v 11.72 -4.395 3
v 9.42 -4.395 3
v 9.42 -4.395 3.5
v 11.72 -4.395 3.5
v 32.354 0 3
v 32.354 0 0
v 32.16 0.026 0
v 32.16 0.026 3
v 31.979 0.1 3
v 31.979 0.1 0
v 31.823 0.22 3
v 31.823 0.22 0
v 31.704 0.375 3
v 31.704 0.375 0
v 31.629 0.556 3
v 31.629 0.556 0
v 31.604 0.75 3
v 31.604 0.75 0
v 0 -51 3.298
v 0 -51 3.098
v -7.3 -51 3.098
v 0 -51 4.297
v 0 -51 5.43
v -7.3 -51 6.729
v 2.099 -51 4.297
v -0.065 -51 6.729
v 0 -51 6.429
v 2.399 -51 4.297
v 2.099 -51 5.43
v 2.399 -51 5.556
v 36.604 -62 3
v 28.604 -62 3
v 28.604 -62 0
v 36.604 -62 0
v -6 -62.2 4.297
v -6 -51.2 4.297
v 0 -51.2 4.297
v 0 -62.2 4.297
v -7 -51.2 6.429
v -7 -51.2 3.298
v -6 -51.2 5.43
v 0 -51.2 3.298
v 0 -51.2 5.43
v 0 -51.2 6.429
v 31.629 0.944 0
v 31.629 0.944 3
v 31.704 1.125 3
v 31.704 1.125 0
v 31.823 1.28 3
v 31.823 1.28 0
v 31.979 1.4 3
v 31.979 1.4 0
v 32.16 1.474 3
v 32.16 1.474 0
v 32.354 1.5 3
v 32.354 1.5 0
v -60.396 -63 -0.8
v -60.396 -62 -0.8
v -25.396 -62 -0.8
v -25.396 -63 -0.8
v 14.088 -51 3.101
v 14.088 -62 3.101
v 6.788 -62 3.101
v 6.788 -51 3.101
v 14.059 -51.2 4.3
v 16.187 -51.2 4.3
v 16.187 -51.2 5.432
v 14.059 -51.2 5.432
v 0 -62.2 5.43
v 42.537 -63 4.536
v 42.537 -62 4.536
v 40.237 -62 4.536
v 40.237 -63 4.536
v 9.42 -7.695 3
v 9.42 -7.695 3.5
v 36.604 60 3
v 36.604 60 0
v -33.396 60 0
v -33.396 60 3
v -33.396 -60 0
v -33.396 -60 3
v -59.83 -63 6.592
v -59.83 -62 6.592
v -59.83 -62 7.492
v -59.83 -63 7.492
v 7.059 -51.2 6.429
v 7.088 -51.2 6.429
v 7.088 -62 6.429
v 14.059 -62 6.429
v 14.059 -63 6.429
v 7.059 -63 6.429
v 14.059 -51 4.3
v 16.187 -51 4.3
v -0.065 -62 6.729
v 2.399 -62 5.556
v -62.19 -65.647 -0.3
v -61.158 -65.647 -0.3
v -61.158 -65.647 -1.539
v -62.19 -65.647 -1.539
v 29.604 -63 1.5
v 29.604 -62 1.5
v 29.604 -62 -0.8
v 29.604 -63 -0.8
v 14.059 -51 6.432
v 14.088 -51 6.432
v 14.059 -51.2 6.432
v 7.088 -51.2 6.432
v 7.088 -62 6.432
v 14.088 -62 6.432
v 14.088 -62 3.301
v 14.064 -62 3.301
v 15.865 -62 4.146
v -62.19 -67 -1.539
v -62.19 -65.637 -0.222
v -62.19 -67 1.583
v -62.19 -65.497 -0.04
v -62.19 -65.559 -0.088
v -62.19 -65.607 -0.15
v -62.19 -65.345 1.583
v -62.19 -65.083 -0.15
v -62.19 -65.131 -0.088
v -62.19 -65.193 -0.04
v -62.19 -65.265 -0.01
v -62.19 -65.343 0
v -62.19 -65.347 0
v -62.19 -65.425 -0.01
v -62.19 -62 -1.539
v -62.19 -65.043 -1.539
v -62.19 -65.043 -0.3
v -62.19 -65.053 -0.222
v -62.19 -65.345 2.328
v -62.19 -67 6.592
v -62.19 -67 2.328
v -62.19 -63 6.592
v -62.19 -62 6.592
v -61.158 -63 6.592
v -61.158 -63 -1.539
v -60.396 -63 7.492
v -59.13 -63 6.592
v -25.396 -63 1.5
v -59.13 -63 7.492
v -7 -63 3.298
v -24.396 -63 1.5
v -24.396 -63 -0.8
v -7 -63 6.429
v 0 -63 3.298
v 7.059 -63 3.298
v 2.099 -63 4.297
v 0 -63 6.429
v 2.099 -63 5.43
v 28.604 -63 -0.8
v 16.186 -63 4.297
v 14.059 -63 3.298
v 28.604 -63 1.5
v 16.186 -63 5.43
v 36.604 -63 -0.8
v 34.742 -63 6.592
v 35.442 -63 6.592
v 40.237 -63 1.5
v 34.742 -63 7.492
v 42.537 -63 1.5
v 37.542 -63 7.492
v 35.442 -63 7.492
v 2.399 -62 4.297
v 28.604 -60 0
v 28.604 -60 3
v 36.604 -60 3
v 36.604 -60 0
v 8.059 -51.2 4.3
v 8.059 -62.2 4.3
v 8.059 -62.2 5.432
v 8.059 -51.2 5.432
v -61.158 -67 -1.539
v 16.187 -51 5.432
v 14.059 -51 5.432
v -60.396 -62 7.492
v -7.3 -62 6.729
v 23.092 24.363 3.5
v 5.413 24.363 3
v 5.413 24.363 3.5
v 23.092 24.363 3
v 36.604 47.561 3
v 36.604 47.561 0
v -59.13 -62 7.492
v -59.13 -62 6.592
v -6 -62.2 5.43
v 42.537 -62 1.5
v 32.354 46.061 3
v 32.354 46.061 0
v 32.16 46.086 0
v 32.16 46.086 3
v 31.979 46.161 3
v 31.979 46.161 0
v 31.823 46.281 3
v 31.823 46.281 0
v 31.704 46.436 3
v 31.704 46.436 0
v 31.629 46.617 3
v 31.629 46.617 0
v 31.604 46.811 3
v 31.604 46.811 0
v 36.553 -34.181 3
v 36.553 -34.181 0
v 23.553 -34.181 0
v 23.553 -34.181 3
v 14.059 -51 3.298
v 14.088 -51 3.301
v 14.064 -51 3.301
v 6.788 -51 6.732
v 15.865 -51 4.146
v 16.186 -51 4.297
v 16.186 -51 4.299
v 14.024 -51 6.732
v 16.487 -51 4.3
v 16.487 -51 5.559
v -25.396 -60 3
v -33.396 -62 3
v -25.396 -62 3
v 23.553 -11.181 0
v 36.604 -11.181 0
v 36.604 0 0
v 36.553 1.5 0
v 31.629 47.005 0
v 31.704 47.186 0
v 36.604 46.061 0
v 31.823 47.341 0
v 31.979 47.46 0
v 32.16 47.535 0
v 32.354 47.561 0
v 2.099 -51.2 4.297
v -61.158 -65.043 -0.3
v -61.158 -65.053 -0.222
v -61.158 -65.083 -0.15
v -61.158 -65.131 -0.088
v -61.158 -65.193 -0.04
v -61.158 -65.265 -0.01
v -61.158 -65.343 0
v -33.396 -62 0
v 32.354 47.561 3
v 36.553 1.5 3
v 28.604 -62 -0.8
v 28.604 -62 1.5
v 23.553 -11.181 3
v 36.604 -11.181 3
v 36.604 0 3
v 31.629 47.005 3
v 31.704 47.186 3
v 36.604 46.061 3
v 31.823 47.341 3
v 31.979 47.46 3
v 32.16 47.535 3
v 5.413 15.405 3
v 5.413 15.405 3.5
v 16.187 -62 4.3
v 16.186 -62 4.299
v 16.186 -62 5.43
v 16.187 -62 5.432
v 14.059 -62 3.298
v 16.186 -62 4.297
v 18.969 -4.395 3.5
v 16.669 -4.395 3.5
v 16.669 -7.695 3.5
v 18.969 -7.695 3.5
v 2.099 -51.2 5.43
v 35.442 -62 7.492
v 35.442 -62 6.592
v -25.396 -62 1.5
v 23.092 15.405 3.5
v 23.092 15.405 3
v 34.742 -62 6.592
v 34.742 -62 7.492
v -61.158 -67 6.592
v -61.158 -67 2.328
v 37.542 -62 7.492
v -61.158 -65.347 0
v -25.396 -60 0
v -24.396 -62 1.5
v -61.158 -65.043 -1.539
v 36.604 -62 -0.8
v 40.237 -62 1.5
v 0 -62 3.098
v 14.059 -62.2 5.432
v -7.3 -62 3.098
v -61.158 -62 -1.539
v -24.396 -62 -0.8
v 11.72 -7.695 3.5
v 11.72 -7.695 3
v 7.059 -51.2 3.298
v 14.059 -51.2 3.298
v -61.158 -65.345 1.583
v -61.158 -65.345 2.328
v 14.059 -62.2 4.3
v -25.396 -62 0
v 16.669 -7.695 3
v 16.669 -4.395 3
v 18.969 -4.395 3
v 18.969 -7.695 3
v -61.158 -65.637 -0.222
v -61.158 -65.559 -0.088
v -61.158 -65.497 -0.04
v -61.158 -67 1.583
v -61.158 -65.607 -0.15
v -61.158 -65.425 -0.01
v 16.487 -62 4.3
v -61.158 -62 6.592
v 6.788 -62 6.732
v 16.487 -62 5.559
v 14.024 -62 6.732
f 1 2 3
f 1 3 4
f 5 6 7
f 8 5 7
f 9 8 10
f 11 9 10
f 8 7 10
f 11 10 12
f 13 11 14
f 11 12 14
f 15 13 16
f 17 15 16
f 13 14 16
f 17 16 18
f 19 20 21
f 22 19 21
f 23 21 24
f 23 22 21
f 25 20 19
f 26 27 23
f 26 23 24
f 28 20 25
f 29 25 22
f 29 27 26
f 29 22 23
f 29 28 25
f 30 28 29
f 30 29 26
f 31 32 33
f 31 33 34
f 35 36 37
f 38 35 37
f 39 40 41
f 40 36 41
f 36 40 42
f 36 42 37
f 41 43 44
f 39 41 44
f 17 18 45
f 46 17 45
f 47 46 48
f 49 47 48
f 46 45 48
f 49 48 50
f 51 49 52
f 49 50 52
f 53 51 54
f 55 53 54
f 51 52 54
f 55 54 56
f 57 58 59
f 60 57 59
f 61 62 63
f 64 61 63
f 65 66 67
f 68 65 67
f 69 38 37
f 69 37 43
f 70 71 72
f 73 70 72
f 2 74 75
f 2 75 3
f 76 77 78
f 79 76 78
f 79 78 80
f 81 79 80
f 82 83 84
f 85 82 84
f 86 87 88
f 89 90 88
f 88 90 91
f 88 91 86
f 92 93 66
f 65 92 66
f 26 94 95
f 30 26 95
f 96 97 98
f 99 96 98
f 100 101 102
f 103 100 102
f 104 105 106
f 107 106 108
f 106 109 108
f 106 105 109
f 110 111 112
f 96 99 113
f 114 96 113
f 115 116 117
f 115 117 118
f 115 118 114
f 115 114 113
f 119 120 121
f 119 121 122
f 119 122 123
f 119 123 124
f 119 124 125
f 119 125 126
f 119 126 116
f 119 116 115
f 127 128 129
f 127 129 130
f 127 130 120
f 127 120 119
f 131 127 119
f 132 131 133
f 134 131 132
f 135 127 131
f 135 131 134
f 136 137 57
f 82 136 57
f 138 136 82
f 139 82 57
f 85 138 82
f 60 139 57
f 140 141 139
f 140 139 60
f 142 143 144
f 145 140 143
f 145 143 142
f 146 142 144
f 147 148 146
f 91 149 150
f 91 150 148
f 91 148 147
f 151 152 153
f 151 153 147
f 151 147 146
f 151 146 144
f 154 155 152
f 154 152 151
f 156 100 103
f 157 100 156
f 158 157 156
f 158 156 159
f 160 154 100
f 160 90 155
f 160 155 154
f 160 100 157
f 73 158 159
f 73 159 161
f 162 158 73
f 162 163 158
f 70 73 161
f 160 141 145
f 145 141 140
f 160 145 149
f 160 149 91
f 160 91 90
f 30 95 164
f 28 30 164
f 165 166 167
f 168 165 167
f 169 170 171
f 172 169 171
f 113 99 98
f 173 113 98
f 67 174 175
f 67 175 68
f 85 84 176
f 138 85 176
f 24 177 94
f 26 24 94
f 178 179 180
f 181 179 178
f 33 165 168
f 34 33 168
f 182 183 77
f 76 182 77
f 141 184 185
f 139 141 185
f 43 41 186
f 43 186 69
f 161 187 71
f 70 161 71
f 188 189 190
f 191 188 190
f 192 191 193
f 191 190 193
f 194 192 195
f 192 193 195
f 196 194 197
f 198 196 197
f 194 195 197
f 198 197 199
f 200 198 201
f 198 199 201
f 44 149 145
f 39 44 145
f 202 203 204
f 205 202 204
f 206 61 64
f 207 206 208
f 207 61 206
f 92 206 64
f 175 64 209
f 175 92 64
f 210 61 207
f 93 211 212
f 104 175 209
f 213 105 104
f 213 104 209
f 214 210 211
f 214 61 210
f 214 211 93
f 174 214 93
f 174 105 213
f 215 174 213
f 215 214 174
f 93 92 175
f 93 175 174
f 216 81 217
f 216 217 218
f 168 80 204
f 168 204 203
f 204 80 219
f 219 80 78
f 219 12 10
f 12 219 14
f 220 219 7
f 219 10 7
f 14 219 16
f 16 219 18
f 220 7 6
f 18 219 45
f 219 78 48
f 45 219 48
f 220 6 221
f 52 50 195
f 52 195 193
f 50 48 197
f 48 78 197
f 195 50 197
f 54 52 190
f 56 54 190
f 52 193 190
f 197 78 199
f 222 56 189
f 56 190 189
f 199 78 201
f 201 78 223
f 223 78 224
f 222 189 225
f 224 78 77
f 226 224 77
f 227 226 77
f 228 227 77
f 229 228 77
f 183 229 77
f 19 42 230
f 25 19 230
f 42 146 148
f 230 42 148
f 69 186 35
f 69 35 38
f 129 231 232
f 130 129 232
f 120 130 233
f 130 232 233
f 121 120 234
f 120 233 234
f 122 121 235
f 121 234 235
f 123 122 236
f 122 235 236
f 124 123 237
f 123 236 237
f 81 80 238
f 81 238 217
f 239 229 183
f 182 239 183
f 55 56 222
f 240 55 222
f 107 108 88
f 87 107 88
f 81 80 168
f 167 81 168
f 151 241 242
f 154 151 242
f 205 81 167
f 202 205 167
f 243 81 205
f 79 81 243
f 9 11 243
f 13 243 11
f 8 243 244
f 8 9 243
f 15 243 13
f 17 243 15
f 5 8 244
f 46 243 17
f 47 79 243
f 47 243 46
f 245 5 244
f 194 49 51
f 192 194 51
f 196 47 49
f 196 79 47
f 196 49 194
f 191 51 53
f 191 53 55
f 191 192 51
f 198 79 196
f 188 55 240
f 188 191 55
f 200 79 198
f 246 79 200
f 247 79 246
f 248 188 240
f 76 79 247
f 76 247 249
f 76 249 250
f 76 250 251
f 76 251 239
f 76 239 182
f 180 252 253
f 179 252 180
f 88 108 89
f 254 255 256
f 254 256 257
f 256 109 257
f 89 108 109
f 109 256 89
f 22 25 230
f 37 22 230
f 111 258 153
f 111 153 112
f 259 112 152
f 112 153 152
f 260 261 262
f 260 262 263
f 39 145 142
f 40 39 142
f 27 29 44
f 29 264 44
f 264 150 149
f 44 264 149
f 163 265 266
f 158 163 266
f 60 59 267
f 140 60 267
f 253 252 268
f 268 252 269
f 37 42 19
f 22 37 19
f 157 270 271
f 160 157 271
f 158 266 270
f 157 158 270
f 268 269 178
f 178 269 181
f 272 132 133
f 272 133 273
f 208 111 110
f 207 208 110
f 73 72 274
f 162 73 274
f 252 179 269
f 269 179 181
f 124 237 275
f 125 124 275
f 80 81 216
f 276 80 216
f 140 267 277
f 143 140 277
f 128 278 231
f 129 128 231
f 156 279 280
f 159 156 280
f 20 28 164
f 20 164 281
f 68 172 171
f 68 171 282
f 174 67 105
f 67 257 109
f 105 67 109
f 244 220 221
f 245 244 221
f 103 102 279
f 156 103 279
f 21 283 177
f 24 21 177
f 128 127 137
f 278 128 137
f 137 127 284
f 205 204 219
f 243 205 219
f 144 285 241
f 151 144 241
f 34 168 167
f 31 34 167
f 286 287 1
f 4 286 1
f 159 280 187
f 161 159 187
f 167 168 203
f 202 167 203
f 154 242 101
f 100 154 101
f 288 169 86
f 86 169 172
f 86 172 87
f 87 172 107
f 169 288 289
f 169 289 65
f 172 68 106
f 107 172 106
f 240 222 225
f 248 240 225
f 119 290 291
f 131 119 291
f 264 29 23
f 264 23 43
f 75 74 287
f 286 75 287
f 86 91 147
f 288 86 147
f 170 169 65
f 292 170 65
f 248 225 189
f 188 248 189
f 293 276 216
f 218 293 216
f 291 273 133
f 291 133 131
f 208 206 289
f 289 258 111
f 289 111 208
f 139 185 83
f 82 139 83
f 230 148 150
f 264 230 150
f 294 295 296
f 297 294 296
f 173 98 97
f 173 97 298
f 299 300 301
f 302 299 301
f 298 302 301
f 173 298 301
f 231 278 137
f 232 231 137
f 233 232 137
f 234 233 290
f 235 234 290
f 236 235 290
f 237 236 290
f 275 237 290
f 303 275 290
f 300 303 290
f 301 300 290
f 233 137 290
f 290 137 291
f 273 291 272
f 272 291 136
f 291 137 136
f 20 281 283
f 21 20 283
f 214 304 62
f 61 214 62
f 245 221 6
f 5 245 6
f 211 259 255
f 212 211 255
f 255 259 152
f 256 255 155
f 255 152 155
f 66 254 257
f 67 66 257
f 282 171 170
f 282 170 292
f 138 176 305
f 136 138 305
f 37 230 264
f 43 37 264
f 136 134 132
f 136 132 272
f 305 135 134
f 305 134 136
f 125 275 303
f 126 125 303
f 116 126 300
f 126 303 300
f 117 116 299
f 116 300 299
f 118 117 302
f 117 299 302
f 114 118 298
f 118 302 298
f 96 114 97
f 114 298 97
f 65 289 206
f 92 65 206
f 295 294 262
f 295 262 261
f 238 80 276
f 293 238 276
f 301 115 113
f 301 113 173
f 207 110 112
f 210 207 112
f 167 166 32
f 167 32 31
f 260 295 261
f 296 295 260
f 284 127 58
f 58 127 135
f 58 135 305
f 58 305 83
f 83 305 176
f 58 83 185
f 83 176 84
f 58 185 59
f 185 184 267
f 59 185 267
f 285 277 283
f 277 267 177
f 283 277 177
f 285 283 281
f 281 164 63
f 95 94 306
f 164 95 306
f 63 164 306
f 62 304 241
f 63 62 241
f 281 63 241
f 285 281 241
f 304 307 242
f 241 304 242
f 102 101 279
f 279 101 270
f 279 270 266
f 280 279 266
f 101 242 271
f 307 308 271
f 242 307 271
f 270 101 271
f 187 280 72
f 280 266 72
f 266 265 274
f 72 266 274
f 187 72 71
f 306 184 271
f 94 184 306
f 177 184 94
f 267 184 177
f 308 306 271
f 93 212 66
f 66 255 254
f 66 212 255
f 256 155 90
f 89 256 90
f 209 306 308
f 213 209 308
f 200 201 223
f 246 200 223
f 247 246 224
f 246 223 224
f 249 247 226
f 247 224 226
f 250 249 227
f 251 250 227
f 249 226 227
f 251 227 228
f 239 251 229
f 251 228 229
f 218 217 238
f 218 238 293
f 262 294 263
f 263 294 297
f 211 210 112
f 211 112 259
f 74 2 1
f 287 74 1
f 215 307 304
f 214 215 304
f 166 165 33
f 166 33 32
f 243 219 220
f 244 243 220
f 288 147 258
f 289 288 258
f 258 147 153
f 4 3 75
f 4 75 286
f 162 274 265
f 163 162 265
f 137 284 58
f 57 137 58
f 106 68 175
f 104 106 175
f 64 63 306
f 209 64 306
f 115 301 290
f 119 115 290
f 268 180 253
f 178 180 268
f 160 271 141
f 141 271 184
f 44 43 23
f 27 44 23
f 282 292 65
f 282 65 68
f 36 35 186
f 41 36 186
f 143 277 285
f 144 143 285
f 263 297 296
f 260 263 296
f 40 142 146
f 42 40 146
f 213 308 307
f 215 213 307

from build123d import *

# Parameters (mm, degrees)
F1_DEPTH  = 3
F2_W      = 8
F2_H      = 3
F3_DEPTH  = 2
F5_DEPTH  = 1
F7_DEPTH  = 25
F9_DEPTH  = 11
F11_DEPTH = 11
F12_W     = 7
F12_H     = 0.2
F13_DEPTH = 3.2
F14_W     = 0.2
F14_H     = 1.1327061802
F15_DEPTH = 5.5
F16_W     = 7
F16_H     = 0.2
F17_DEPTH = 3.19
F18_W     = 0.2
F18_H     = 1.1327061802
F19_DEPTH = 7.4
F20_W     = 6
F20_H     = 1.1327061802
F21_DEPTH = 11
F22_W     = 6
F22_H     = 1.1327061802
F23_DEPTH = 11
F24_W     = 1.0315924883
F24_H     = 8.1316158699
F25_DEPTH = 4
F26_W     = 1.6550530118
F26_H     = 0.745086465
F27_DEPTH = 25
F28_W     = 17.6785664628
F28_H     = 8.9571411045
F29_DEPTH = 0.5
F28_W_2   = 2.3
F28_H_2   = 3.3


with BuildPart() as f1:
    # F0 (on Top) → F1 (new body)
    with BuildSketch(Plane.XY):
        with BuildLine():
            Line((36.6037742128, 60), (-33.3962257872, 60))
            Line((-33.3962257872, 60), (-33.3962257872, -60))
            Line((-33.3962257872, -60), (36.6037742128, -60))
            Line((36.6037742128, -60), (36.5525332391, -34.1813638806))
            Line((36.5525332391, -34.1813638806), (23.5525332391, -34.1813638806))
            Line((23.5525332391, -34.1813638806), (23.5525332391, -11.1813638806))
            Line((23.5525332391, -11.1813638806), (36.5525332391, -11.1813638806))
            Line((36.5525332391, -11.1813638806), (36.6037742128, -11.1813638806))
            Line((36.6037742128, -11.1813638806), (36.6037742128, 0))
            Line((36.6037742128, 0), (32.3537742128, 0))
            ThreePointArc((32.3537742128, 0), (31.8234441269, 0.2196699141), (31.6037742128, 0.75))
            ThreePointArc((31.6037742128, 0.75), (31.8234441269, 1.2803300859), (32.3537742128, 1.5))
            Line((32.3537742128, 1.5), (36.5525332391, 1.5))
            Line((36.5525332391, 1.5), (36.6037742128, 46.0609085858))
            Line((36.6037742128, 46.0609085858), (32.3537742128, 46.0609085858))
            ThreePointArc((32.3537742128, 46.0609085858), (31.8234441269, 46.2805784999), (31.6037742128, 46.8109085858))
            ThreePointArc((31.6037742128, 46.8109085858), (31.8234441269, 47.3412386717), (32.3537742128, 47.5609085858))
            Line((32.3537742128, 47.5609085858), (36.6037742128, 47.5609085858))
            Line((36.6037742128, 47.5609085858), (36.6037742128, 60))
        make_face()
    extrude(amount=F1_DEPTH)


with BuildPart() as f3:
    # F2 (on face) → F3 (new body)
    with BuildSketch(Plane.XZ.offset(60)):
        with Locations((32.6037742128, 1.5)):
            Rectangle(F2_W, F2_H)
    extrude(amount=F3_DEPTH)


with BuildPart() as f3b:
    # F2 (on face) → F3, piece 2 (new body)
    with BuildSketch(Plane.XZ.offset(60)):
        with Locations((-29.3962257872, 1.5)):
            Rectangle(F2_W, F2_H)
    extrude(amount=F3_DEPTH)


with BuildPart() as f5:
    # F4 (on face) → F5 (new body)
    with BuildSketch(Plane.XZ.offset(62)):
        Polygon((-25.3962257872, -0.8), (-25.3962257872, 0), (-25.3962257872, 1.5), (-24.3962257872, 1.5), (-24.3962257872, -0.8), (28.6037009209, -0.8), (28.6037009209, 0), (28.6037009209, 0.1021988282), (28.6037009209, 1.5), (29.6037009209, 1.5), (29.6037009209, 0), (29.6037009209, -0.8), (36.6037009209, -0.8), (40.2368813459, 1.5), (42.5368813459, 1.5), (42.5368813459, 4.5362776145), (40.2368813459, 4.5362776145), (37.5422888717, 7.4924865717), (35.4422888717, 7.4924865717), (35.4422888717, 6.5924865717), (34.7422888717, 6.5924865717), (34.7422888717, 7.4924865717), (-59.12965976, 7.4924865717), (-59.12965976, 6.5924865717), (-59.82965976, 6.5924865717), (-59.82965976, 7.4924865717), (-60.3962257872, 7.4924865717), (-61.1580461264, 6.5924865717), (-62.1896386147, 6.5924865717), (-62.1896386147, -1.5391292982), (-61.1580461264, -1.5391292982), (-60.3962257872, -0.8), align=None)
    extrude(amount=F5_DEPTH)

    # F6 (on face) → F7 (cut)
    with BuildSketch(Plane.XZ.offset(63)):
        Polygon((16.1862980872, 4.2971617077), (16.1862980872, 5.4298678879), (14.0588406771, 6.4291018192), (7.0588406771, 6.4291018192), (7.0588406771, 3.2979277764), (14.0588406771, 3.2979277764), align=None)
        Polygon((2.0989337936, 5.4298678879), (0, 6.4291018192), (-7, 6.4291018192), (-7, 3.2981018192), (0, 3.2981018192), (2.0989337936, 4.2971617077), align=None)
    extrude(amount=-F7_DEPTH, mode=Mode.SUBTRACT)

    # F8 (on face) → F9 (join)
    with BuildSketch(Plane(origin=(0, -62, 0), x_dir=(-1, 0, 0), z_dir=(0, 1, 0))):
        Polygon((7.3, 6.7291018192), (3.3125772607, 6.7291018192), (0.064611199, 6.7291018192), (-2.3986711167, 5.5564134382), (-2.3986711167, 4.2971617077), (0, 3.0981018192), (7.3, 3.0981018192), align=None)
        Polygon((-2.0989337936, 5.4298678879), (0, 6.4291018192), (7, 6.4291018192), (7, 3.2981018192), (0, 3.2981018192), (-2.0989337936, 4.2971617077), align=None, mode=Mode.SUBTRACT)
    extrude(amount=F9_DEPTH)

    # F10 (on face) → F11 (join)
    with BuildSketch(Plane(origin=(0, -62, 0), x_dir=(-1, 0, 0), z_dir=(0, 1, 0))):
        Polygon((-6.7882863318, 6.731566316), (-10.7757090712, 6.731566316), (-14.0236751328, 6.731566316), (-16.4869574485, 5.558877935), (-16.4869574485, 4.2996262045), (-14.0882863318, 3.100566316), (-6.7882863318, 3.100566316), align=None)
        Polygon((-16.1872201254, 5.4323323847), (-14.0882863318, 6.431566316), (-7.0882863318, 6.431566316), (-7.0882863318, 6.4291018192), (-7.0588406771, 6.4291018192), (-7.0588406771, 3.2979277764), (-14.0588406771, 3.2979277764), (-14.0644583614, 3.300566316), (-14.0882863318, 3.300566316), (-15.8647655234, 4.1461428218), (-16.1862980872, 4.2971617077), (-16.1862980872, 4.2991873286), (-16.1872201254, 4.2996262045), align=None, mode=Mode.SUBTRACT)
    extrude(amount=F11_DEPTH)

    # F12 (on face) → F13 (join)
    with BuildSketch(Plane.XY.offset(3.2981018192)):
        with Locations((-3.5, -51.1)):
            Rectangle(F12_W, F12_H)
    extrude(amount=F13_DEPTH)

    # F14 (on face) → F15 (join)
    with BuildSketch(Plane(origin=(2.0989337936, 0, 0), x_dir=(0, -1, 0), z_dir=(-1, 0, 0))):
        with Locations((51.1, 4.8635147978)):
            Rectangle(F14_W, F14_H)
    extrude(amount=F15_DEPTH)

    # F16 (on face) → F17 (join)
    with BuildSketch(Plane.XY.offset(3.2979277764)):
        with Locations((10.5588406771, -51.1)):
            Rectangle(F16_W, F16_H)
    extrude(amount=F17_DEPTH)

    # F18 (on face) → F19 (join)
    with BuildSketch(Plane(origin=(16.1872201254, 0, 0), x_dir=(0, -1, 0), z_dir=(-1, 0, 0))):
        with Locations((51.1, 4.8659792946)):
            Rectangle(F18_W, F18_H)
    extrude(amount=F19_DEPTH)

    # F20 (on face) → F21 (join)
    with BuildSketch(Plane.XZ.offset(51.2)):
        with Locations((-3, 4.8635147978)):
            Rectangle(F20_W, F20_H)
    extrude(amount=F21_DEPTH)

    # F22 (on face) → F23 (join)
    with BuildSketch(Plane.XZ.offset(51.2)):
        with Locations((11.0588406771, 4.8659792946)):
            Rectangle(F22_W, F22_H)
    extrude(amount=F23_DEPTH)

    # F24 (on face) → F25 (join)
    with BuildSketch(Plane.XZ.offset(63)):
        with Locations((-61.6738423705, 2.5266786368)):
            Rectangle(F24_W, F24_H)
    extrude(amount=F25_DEPTH)

    # F26 (on face) → F27 (cut)
    with BuildSketch(Plane.YZ.offset(-61.1580461264)):
        with BuildLine():
            Line((-65.6472089325, -0.3), (-65.6472089325, -1.5391292982))
            Line((-65.6472089325, -1.5391292982), (-65.0426850438, -1.5391292982))
            Line((-65.0426850438, -1.5391292982), (-65.0426850438, -0.3))
            ThreePointArc((-65.0426850438, -0.3), (-65.1305530095, -0.0878679656), (-65.3426850438, 0))
            Line((-65.3426850438, 0), (-65.3472089325, 0))
            ThreePointArc((-65.3472089325, 0), (-65.5593409669, -0.0878679656), (-65.6472089325, -0.3))
        make_face()
        with Locations((-66.1724734941, 1.9554740284)):
            Rectangle(F26_W, F26_H)
    extrude(amount=-F27_DEPTH, mode=Mode.SUBTRACT)


with BuildPart() as f29:
    # F28 (on face) → F29 (new body)
    with BuildSketch(Plane.XY.offset(3)):
        with Locations((14.2523010727, 19.8839701561)):
            Rectangle(F28_W, F28_H)
    extrude(amount=F29_DEPTH)


with BuildPart() as f29b:
    # F28 (on face) → F29, piece 2 (new body)
    with BuildSketch(Plane.XY.offset(3)):
        with Locations((10.5701600818, -6.0445953979)):
            Rectangle(F28_W_2, F28_H_2)
    extrude(amount=F29_DEPTH)


with BuildPart() as f29c:
    # F28 (on face) → F29, piece 3 (new body)
    with BuildSketch(Plane.XY.offset(3)):
        with Locations((17.8193851352, -6.0445953979)):
            Rectangle(F28_W_2, F28_H_2)
    extrude(amount=F29_DEPTH)


solid = Compound([f1.part, f3.part, f3b.part, f5.part, f29.part, f29b.part, f29c.part])
